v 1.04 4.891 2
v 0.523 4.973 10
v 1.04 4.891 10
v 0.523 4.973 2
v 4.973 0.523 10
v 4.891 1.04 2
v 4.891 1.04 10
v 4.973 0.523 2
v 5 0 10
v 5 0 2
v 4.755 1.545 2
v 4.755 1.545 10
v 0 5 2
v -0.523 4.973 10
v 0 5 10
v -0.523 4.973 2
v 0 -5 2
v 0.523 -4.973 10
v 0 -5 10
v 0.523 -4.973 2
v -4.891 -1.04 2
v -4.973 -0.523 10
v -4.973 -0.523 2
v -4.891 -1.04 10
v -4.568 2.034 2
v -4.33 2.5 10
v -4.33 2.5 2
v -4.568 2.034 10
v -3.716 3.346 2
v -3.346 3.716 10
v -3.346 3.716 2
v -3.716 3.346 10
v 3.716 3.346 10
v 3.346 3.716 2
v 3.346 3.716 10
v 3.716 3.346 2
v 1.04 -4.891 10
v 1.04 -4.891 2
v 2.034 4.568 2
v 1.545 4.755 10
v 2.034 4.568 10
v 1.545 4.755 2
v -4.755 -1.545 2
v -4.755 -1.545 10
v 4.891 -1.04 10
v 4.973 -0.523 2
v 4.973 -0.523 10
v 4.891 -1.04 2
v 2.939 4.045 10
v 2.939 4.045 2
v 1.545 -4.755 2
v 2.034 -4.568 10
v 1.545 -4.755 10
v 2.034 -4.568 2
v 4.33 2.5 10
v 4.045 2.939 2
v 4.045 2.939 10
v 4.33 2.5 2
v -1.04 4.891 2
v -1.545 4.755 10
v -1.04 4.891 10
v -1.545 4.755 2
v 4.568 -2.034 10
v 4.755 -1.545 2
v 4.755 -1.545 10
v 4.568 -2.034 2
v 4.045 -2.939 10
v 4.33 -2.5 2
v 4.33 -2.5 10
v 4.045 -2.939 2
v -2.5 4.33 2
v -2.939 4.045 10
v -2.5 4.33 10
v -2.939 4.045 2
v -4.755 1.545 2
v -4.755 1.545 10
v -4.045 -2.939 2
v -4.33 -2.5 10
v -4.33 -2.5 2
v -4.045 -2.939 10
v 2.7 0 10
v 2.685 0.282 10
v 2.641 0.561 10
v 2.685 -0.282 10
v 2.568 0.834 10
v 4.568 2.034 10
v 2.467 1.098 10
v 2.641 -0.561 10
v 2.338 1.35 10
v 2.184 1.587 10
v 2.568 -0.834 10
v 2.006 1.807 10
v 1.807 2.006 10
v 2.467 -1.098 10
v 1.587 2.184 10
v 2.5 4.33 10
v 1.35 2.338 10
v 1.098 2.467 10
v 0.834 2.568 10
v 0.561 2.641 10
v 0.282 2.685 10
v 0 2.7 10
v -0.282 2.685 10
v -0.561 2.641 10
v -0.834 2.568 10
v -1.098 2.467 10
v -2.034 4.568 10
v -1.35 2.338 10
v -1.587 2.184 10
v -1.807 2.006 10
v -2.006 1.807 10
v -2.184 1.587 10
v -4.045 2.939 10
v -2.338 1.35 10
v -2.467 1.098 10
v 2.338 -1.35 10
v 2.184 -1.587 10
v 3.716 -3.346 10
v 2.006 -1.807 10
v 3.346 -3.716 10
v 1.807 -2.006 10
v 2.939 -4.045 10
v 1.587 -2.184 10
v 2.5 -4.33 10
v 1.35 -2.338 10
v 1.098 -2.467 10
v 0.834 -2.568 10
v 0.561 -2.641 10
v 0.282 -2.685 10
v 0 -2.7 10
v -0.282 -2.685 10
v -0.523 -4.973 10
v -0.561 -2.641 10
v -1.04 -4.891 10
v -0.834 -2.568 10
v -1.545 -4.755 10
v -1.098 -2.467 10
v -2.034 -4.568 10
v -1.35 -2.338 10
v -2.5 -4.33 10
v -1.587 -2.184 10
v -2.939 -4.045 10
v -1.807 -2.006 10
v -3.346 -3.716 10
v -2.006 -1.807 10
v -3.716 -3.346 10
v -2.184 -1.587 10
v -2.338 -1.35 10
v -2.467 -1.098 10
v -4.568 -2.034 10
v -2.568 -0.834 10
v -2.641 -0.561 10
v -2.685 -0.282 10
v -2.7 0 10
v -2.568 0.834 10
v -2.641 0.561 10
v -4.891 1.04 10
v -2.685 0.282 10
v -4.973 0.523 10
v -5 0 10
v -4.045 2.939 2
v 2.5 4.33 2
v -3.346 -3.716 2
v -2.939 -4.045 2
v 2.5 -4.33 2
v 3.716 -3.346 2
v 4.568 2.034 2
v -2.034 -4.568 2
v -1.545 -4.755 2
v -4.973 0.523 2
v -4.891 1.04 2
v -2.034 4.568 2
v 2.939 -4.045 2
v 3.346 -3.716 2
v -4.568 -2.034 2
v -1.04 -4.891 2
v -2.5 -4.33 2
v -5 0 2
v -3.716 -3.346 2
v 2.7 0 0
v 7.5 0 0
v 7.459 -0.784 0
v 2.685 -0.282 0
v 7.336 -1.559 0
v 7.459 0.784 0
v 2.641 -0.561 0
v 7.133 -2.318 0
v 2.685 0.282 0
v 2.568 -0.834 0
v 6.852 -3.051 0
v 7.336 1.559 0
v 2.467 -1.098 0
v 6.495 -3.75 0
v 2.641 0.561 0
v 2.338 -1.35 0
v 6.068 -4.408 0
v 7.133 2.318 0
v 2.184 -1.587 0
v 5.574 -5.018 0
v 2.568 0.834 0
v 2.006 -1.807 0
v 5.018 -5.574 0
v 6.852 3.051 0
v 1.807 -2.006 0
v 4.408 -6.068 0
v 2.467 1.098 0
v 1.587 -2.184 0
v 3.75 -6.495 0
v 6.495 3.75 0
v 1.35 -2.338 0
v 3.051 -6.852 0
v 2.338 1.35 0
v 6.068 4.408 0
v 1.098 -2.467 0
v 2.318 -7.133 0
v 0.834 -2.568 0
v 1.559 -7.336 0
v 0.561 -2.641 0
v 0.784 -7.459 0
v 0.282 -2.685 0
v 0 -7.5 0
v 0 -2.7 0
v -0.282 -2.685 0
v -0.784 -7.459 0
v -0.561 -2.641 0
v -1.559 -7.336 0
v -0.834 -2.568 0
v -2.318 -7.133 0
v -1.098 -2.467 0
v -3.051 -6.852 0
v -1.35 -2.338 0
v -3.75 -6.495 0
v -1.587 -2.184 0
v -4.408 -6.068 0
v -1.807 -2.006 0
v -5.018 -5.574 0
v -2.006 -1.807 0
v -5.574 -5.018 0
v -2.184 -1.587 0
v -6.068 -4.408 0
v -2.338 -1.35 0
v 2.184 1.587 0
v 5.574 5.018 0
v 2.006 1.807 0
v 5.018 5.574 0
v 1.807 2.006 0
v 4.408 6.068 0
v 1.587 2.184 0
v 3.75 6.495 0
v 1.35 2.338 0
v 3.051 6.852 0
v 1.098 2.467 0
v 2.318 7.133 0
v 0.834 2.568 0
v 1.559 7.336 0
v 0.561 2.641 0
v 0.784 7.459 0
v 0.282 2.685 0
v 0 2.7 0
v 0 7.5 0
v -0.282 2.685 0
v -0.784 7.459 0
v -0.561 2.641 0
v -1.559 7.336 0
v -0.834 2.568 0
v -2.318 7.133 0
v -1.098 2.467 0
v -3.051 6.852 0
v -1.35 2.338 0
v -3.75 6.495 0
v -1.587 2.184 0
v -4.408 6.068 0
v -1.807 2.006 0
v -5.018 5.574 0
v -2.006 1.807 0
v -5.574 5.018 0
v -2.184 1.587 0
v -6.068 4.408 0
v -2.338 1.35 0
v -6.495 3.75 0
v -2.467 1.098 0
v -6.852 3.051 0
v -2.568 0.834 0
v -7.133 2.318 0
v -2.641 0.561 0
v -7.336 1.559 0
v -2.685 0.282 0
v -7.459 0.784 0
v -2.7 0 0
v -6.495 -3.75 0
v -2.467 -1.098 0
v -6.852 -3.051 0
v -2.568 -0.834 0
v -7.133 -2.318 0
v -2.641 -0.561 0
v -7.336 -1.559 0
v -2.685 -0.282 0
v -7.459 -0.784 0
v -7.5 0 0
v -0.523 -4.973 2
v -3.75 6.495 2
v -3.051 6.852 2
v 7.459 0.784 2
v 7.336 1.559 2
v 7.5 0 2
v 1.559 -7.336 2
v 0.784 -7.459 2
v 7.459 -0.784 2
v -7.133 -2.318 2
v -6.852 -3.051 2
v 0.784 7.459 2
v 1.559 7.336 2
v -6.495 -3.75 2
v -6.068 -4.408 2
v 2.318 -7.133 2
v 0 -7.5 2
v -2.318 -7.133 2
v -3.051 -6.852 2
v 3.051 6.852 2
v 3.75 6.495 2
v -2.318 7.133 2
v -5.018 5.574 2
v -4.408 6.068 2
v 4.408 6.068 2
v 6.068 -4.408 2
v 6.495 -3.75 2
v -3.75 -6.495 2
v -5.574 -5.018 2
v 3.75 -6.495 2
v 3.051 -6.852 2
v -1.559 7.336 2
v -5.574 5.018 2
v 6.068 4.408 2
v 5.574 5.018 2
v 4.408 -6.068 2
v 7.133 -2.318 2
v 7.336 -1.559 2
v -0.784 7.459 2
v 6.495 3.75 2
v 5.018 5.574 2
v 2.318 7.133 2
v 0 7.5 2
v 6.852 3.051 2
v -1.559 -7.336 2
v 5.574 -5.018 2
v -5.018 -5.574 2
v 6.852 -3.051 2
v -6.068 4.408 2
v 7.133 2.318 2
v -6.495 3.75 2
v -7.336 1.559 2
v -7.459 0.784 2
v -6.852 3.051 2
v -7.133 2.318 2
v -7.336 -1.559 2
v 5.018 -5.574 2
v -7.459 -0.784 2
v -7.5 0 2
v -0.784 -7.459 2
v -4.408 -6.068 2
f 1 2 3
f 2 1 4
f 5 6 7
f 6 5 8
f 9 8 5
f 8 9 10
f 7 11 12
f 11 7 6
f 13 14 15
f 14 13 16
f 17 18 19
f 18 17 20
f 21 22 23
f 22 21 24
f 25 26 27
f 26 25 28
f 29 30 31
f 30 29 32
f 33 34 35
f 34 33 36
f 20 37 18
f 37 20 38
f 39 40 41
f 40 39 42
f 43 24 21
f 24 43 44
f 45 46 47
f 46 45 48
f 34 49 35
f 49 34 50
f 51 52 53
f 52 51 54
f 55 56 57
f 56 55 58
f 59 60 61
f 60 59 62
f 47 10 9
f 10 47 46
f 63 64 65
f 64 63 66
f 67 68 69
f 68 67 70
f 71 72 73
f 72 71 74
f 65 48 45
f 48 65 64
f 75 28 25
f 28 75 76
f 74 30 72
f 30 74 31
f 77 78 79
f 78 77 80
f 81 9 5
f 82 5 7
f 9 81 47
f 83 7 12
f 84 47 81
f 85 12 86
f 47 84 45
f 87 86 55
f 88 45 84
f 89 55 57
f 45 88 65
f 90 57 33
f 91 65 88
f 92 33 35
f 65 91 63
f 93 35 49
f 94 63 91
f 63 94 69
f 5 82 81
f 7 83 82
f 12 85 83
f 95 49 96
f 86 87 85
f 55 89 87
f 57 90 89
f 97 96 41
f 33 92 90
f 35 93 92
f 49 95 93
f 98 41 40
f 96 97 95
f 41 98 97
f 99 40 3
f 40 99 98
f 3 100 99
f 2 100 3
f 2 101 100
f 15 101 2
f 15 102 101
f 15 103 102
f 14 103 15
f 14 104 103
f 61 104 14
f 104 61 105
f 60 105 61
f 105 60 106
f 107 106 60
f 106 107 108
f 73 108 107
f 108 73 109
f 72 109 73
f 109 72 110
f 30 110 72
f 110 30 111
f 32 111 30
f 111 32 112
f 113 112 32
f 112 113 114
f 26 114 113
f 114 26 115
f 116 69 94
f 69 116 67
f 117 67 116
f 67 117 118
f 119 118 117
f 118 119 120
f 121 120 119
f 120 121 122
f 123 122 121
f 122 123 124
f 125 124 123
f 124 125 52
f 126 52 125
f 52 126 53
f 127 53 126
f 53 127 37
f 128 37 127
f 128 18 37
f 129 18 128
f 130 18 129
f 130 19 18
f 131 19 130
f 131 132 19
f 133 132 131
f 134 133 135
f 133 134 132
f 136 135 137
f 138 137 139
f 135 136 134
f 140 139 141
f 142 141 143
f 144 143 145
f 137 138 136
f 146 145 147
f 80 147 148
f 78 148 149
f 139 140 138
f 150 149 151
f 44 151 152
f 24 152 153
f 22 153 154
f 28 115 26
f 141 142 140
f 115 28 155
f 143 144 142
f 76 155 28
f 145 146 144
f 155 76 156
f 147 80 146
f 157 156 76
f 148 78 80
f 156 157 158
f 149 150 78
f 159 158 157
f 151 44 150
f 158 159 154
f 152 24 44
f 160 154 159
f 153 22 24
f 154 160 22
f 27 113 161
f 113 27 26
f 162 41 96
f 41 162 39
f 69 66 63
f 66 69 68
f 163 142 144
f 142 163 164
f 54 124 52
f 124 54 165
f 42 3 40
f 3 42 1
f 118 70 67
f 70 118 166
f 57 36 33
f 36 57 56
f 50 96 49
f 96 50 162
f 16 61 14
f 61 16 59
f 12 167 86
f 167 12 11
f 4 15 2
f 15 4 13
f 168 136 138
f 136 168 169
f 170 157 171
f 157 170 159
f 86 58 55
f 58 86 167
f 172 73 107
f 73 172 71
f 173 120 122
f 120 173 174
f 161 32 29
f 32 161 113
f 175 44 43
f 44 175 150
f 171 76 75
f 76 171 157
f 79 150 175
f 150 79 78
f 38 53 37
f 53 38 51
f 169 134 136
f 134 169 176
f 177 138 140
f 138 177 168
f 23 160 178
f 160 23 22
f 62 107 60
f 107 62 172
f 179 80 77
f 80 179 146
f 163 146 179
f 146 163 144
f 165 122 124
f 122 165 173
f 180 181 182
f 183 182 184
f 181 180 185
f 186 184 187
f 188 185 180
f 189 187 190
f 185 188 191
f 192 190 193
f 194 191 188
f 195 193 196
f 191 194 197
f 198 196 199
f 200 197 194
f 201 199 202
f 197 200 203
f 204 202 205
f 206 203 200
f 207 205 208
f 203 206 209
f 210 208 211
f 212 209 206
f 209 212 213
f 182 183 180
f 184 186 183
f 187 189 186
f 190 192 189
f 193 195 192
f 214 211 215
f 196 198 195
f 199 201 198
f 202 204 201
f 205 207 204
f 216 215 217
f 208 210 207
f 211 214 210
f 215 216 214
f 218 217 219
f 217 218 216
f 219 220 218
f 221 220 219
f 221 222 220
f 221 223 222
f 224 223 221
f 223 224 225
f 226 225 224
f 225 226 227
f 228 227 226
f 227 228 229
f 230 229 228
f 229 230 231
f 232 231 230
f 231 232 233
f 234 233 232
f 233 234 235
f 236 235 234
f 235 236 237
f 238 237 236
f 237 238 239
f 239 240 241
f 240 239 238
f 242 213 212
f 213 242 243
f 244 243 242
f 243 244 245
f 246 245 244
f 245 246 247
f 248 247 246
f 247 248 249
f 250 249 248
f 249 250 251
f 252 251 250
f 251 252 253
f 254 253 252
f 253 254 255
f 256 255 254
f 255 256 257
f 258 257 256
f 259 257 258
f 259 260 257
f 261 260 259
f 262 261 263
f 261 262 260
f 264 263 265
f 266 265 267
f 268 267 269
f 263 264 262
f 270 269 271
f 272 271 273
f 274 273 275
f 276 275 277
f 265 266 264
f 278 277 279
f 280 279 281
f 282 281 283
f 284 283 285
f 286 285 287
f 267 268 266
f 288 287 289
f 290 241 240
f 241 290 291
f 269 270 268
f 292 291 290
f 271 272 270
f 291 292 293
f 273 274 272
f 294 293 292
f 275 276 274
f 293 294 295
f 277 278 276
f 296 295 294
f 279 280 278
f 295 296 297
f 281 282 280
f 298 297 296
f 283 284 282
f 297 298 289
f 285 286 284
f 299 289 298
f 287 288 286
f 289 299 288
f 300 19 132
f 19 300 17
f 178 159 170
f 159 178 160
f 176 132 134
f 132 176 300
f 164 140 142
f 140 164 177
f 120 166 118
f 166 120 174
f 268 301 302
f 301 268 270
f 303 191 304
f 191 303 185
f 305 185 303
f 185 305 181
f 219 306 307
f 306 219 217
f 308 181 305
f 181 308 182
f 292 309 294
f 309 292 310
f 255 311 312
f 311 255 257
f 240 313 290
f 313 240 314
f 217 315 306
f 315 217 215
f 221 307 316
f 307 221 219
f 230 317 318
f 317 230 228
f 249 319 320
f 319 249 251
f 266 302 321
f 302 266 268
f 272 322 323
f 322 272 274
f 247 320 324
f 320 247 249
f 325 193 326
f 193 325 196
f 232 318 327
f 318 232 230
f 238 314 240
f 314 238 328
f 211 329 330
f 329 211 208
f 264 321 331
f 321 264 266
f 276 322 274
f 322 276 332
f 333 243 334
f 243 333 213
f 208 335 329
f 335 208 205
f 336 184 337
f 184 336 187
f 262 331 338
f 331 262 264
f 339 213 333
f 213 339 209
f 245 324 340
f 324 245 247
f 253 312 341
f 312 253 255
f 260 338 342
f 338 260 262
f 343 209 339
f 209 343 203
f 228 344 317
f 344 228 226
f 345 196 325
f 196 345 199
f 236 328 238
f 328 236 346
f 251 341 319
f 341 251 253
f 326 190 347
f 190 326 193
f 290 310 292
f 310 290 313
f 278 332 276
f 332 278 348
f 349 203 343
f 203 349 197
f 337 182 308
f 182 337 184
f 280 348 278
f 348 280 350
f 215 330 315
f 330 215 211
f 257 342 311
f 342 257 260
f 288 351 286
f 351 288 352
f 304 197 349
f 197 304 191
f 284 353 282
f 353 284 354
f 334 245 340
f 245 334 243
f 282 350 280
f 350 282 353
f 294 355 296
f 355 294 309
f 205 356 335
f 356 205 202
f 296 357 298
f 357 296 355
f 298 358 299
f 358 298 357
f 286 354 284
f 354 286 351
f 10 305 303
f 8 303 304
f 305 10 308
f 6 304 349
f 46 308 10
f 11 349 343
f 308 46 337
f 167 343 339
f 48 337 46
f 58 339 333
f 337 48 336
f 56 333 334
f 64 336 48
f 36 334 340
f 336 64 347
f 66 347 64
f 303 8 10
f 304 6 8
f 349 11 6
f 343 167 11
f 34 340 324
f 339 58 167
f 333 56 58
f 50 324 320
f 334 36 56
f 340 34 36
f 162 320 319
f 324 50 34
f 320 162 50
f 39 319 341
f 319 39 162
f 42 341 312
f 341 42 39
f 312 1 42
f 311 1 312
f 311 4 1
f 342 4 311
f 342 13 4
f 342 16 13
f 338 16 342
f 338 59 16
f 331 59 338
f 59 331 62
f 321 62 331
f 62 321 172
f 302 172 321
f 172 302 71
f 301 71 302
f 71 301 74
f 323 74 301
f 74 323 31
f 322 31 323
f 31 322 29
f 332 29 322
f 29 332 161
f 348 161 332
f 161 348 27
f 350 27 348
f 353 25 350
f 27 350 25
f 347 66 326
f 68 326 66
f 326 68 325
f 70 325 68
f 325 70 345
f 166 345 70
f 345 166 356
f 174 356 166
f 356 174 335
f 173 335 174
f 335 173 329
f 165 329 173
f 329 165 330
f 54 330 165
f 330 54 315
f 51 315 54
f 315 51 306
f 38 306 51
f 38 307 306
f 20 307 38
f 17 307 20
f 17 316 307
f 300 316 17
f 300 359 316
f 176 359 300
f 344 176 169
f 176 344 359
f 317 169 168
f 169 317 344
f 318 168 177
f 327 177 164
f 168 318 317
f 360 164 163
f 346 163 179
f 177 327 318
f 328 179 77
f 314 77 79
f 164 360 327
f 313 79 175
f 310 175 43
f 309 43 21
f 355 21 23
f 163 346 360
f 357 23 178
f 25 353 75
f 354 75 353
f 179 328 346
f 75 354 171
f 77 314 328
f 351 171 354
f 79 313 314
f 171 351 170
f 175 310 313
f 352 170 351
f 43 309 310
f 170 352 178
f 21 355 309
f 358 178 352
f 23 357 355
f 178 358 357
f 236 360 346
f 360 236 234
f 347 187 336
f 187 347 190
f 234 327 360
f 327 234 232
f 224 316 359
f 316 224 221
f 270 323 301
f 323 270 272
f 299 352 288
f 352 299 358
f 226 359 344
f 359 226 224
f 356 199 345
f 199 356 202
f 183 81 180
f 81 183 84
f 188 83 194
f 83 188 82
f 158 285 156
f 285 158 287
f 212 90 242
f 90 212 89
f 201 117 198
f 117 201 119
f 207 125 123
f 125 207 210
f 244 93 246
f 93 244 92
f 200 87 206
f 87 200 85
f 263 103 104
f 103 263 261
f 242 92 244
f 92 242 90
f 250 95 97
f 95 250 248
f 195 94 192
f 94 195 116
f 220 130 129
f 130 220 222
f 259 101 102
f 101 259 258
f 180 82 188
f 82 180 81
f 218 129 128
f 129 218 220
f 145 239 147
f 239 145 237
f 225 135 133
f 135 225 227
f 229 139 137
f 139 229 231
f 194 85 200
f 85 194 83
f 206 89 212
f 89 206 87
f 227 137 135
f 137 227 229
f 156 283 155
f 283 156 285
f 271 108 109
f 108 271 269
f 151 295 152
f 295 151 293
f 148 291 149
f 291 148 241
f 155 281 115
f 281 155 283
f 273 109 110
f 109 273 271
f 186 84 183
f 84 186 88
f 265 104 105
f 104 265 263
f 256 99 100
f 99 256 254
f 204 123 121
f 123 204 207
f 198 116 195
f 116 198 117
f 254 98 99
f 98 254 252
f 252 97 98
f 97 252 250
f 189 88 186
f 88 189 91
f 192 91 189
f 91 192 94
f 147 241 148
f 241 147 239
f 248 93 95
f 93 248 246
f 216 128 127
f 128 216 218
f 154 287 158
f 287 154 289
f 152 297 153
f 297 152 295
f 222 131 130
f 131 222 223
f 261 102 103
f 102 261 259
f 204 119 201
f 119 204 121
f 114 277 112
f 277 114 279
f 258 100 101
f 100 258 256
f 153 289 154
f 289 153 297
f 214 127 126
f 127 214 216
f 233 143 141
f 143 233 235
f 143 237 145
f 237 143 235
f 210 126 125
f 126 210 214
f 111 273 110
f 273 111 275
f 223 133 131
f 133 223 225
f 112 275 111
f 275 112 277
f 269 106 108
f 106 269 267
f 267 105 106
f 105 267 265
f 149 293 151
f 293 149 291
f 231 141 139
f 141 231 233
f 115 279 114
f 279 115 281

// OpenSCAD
// Rivet nut / nutsert.
$fn = 60;
eps = 0.02;
thread_d = 5.4;
outer_d = 10;
length = 10;
flange_d = 15;
difference() { union() { cylinder(d=max(outer_d, thread_d+3),h=length); cylinder(d=max(flange_d, thread_d+6),h=2); } translate([0,0,-eps]) cylinder(d=thread_d,h=length+2*eps); }
